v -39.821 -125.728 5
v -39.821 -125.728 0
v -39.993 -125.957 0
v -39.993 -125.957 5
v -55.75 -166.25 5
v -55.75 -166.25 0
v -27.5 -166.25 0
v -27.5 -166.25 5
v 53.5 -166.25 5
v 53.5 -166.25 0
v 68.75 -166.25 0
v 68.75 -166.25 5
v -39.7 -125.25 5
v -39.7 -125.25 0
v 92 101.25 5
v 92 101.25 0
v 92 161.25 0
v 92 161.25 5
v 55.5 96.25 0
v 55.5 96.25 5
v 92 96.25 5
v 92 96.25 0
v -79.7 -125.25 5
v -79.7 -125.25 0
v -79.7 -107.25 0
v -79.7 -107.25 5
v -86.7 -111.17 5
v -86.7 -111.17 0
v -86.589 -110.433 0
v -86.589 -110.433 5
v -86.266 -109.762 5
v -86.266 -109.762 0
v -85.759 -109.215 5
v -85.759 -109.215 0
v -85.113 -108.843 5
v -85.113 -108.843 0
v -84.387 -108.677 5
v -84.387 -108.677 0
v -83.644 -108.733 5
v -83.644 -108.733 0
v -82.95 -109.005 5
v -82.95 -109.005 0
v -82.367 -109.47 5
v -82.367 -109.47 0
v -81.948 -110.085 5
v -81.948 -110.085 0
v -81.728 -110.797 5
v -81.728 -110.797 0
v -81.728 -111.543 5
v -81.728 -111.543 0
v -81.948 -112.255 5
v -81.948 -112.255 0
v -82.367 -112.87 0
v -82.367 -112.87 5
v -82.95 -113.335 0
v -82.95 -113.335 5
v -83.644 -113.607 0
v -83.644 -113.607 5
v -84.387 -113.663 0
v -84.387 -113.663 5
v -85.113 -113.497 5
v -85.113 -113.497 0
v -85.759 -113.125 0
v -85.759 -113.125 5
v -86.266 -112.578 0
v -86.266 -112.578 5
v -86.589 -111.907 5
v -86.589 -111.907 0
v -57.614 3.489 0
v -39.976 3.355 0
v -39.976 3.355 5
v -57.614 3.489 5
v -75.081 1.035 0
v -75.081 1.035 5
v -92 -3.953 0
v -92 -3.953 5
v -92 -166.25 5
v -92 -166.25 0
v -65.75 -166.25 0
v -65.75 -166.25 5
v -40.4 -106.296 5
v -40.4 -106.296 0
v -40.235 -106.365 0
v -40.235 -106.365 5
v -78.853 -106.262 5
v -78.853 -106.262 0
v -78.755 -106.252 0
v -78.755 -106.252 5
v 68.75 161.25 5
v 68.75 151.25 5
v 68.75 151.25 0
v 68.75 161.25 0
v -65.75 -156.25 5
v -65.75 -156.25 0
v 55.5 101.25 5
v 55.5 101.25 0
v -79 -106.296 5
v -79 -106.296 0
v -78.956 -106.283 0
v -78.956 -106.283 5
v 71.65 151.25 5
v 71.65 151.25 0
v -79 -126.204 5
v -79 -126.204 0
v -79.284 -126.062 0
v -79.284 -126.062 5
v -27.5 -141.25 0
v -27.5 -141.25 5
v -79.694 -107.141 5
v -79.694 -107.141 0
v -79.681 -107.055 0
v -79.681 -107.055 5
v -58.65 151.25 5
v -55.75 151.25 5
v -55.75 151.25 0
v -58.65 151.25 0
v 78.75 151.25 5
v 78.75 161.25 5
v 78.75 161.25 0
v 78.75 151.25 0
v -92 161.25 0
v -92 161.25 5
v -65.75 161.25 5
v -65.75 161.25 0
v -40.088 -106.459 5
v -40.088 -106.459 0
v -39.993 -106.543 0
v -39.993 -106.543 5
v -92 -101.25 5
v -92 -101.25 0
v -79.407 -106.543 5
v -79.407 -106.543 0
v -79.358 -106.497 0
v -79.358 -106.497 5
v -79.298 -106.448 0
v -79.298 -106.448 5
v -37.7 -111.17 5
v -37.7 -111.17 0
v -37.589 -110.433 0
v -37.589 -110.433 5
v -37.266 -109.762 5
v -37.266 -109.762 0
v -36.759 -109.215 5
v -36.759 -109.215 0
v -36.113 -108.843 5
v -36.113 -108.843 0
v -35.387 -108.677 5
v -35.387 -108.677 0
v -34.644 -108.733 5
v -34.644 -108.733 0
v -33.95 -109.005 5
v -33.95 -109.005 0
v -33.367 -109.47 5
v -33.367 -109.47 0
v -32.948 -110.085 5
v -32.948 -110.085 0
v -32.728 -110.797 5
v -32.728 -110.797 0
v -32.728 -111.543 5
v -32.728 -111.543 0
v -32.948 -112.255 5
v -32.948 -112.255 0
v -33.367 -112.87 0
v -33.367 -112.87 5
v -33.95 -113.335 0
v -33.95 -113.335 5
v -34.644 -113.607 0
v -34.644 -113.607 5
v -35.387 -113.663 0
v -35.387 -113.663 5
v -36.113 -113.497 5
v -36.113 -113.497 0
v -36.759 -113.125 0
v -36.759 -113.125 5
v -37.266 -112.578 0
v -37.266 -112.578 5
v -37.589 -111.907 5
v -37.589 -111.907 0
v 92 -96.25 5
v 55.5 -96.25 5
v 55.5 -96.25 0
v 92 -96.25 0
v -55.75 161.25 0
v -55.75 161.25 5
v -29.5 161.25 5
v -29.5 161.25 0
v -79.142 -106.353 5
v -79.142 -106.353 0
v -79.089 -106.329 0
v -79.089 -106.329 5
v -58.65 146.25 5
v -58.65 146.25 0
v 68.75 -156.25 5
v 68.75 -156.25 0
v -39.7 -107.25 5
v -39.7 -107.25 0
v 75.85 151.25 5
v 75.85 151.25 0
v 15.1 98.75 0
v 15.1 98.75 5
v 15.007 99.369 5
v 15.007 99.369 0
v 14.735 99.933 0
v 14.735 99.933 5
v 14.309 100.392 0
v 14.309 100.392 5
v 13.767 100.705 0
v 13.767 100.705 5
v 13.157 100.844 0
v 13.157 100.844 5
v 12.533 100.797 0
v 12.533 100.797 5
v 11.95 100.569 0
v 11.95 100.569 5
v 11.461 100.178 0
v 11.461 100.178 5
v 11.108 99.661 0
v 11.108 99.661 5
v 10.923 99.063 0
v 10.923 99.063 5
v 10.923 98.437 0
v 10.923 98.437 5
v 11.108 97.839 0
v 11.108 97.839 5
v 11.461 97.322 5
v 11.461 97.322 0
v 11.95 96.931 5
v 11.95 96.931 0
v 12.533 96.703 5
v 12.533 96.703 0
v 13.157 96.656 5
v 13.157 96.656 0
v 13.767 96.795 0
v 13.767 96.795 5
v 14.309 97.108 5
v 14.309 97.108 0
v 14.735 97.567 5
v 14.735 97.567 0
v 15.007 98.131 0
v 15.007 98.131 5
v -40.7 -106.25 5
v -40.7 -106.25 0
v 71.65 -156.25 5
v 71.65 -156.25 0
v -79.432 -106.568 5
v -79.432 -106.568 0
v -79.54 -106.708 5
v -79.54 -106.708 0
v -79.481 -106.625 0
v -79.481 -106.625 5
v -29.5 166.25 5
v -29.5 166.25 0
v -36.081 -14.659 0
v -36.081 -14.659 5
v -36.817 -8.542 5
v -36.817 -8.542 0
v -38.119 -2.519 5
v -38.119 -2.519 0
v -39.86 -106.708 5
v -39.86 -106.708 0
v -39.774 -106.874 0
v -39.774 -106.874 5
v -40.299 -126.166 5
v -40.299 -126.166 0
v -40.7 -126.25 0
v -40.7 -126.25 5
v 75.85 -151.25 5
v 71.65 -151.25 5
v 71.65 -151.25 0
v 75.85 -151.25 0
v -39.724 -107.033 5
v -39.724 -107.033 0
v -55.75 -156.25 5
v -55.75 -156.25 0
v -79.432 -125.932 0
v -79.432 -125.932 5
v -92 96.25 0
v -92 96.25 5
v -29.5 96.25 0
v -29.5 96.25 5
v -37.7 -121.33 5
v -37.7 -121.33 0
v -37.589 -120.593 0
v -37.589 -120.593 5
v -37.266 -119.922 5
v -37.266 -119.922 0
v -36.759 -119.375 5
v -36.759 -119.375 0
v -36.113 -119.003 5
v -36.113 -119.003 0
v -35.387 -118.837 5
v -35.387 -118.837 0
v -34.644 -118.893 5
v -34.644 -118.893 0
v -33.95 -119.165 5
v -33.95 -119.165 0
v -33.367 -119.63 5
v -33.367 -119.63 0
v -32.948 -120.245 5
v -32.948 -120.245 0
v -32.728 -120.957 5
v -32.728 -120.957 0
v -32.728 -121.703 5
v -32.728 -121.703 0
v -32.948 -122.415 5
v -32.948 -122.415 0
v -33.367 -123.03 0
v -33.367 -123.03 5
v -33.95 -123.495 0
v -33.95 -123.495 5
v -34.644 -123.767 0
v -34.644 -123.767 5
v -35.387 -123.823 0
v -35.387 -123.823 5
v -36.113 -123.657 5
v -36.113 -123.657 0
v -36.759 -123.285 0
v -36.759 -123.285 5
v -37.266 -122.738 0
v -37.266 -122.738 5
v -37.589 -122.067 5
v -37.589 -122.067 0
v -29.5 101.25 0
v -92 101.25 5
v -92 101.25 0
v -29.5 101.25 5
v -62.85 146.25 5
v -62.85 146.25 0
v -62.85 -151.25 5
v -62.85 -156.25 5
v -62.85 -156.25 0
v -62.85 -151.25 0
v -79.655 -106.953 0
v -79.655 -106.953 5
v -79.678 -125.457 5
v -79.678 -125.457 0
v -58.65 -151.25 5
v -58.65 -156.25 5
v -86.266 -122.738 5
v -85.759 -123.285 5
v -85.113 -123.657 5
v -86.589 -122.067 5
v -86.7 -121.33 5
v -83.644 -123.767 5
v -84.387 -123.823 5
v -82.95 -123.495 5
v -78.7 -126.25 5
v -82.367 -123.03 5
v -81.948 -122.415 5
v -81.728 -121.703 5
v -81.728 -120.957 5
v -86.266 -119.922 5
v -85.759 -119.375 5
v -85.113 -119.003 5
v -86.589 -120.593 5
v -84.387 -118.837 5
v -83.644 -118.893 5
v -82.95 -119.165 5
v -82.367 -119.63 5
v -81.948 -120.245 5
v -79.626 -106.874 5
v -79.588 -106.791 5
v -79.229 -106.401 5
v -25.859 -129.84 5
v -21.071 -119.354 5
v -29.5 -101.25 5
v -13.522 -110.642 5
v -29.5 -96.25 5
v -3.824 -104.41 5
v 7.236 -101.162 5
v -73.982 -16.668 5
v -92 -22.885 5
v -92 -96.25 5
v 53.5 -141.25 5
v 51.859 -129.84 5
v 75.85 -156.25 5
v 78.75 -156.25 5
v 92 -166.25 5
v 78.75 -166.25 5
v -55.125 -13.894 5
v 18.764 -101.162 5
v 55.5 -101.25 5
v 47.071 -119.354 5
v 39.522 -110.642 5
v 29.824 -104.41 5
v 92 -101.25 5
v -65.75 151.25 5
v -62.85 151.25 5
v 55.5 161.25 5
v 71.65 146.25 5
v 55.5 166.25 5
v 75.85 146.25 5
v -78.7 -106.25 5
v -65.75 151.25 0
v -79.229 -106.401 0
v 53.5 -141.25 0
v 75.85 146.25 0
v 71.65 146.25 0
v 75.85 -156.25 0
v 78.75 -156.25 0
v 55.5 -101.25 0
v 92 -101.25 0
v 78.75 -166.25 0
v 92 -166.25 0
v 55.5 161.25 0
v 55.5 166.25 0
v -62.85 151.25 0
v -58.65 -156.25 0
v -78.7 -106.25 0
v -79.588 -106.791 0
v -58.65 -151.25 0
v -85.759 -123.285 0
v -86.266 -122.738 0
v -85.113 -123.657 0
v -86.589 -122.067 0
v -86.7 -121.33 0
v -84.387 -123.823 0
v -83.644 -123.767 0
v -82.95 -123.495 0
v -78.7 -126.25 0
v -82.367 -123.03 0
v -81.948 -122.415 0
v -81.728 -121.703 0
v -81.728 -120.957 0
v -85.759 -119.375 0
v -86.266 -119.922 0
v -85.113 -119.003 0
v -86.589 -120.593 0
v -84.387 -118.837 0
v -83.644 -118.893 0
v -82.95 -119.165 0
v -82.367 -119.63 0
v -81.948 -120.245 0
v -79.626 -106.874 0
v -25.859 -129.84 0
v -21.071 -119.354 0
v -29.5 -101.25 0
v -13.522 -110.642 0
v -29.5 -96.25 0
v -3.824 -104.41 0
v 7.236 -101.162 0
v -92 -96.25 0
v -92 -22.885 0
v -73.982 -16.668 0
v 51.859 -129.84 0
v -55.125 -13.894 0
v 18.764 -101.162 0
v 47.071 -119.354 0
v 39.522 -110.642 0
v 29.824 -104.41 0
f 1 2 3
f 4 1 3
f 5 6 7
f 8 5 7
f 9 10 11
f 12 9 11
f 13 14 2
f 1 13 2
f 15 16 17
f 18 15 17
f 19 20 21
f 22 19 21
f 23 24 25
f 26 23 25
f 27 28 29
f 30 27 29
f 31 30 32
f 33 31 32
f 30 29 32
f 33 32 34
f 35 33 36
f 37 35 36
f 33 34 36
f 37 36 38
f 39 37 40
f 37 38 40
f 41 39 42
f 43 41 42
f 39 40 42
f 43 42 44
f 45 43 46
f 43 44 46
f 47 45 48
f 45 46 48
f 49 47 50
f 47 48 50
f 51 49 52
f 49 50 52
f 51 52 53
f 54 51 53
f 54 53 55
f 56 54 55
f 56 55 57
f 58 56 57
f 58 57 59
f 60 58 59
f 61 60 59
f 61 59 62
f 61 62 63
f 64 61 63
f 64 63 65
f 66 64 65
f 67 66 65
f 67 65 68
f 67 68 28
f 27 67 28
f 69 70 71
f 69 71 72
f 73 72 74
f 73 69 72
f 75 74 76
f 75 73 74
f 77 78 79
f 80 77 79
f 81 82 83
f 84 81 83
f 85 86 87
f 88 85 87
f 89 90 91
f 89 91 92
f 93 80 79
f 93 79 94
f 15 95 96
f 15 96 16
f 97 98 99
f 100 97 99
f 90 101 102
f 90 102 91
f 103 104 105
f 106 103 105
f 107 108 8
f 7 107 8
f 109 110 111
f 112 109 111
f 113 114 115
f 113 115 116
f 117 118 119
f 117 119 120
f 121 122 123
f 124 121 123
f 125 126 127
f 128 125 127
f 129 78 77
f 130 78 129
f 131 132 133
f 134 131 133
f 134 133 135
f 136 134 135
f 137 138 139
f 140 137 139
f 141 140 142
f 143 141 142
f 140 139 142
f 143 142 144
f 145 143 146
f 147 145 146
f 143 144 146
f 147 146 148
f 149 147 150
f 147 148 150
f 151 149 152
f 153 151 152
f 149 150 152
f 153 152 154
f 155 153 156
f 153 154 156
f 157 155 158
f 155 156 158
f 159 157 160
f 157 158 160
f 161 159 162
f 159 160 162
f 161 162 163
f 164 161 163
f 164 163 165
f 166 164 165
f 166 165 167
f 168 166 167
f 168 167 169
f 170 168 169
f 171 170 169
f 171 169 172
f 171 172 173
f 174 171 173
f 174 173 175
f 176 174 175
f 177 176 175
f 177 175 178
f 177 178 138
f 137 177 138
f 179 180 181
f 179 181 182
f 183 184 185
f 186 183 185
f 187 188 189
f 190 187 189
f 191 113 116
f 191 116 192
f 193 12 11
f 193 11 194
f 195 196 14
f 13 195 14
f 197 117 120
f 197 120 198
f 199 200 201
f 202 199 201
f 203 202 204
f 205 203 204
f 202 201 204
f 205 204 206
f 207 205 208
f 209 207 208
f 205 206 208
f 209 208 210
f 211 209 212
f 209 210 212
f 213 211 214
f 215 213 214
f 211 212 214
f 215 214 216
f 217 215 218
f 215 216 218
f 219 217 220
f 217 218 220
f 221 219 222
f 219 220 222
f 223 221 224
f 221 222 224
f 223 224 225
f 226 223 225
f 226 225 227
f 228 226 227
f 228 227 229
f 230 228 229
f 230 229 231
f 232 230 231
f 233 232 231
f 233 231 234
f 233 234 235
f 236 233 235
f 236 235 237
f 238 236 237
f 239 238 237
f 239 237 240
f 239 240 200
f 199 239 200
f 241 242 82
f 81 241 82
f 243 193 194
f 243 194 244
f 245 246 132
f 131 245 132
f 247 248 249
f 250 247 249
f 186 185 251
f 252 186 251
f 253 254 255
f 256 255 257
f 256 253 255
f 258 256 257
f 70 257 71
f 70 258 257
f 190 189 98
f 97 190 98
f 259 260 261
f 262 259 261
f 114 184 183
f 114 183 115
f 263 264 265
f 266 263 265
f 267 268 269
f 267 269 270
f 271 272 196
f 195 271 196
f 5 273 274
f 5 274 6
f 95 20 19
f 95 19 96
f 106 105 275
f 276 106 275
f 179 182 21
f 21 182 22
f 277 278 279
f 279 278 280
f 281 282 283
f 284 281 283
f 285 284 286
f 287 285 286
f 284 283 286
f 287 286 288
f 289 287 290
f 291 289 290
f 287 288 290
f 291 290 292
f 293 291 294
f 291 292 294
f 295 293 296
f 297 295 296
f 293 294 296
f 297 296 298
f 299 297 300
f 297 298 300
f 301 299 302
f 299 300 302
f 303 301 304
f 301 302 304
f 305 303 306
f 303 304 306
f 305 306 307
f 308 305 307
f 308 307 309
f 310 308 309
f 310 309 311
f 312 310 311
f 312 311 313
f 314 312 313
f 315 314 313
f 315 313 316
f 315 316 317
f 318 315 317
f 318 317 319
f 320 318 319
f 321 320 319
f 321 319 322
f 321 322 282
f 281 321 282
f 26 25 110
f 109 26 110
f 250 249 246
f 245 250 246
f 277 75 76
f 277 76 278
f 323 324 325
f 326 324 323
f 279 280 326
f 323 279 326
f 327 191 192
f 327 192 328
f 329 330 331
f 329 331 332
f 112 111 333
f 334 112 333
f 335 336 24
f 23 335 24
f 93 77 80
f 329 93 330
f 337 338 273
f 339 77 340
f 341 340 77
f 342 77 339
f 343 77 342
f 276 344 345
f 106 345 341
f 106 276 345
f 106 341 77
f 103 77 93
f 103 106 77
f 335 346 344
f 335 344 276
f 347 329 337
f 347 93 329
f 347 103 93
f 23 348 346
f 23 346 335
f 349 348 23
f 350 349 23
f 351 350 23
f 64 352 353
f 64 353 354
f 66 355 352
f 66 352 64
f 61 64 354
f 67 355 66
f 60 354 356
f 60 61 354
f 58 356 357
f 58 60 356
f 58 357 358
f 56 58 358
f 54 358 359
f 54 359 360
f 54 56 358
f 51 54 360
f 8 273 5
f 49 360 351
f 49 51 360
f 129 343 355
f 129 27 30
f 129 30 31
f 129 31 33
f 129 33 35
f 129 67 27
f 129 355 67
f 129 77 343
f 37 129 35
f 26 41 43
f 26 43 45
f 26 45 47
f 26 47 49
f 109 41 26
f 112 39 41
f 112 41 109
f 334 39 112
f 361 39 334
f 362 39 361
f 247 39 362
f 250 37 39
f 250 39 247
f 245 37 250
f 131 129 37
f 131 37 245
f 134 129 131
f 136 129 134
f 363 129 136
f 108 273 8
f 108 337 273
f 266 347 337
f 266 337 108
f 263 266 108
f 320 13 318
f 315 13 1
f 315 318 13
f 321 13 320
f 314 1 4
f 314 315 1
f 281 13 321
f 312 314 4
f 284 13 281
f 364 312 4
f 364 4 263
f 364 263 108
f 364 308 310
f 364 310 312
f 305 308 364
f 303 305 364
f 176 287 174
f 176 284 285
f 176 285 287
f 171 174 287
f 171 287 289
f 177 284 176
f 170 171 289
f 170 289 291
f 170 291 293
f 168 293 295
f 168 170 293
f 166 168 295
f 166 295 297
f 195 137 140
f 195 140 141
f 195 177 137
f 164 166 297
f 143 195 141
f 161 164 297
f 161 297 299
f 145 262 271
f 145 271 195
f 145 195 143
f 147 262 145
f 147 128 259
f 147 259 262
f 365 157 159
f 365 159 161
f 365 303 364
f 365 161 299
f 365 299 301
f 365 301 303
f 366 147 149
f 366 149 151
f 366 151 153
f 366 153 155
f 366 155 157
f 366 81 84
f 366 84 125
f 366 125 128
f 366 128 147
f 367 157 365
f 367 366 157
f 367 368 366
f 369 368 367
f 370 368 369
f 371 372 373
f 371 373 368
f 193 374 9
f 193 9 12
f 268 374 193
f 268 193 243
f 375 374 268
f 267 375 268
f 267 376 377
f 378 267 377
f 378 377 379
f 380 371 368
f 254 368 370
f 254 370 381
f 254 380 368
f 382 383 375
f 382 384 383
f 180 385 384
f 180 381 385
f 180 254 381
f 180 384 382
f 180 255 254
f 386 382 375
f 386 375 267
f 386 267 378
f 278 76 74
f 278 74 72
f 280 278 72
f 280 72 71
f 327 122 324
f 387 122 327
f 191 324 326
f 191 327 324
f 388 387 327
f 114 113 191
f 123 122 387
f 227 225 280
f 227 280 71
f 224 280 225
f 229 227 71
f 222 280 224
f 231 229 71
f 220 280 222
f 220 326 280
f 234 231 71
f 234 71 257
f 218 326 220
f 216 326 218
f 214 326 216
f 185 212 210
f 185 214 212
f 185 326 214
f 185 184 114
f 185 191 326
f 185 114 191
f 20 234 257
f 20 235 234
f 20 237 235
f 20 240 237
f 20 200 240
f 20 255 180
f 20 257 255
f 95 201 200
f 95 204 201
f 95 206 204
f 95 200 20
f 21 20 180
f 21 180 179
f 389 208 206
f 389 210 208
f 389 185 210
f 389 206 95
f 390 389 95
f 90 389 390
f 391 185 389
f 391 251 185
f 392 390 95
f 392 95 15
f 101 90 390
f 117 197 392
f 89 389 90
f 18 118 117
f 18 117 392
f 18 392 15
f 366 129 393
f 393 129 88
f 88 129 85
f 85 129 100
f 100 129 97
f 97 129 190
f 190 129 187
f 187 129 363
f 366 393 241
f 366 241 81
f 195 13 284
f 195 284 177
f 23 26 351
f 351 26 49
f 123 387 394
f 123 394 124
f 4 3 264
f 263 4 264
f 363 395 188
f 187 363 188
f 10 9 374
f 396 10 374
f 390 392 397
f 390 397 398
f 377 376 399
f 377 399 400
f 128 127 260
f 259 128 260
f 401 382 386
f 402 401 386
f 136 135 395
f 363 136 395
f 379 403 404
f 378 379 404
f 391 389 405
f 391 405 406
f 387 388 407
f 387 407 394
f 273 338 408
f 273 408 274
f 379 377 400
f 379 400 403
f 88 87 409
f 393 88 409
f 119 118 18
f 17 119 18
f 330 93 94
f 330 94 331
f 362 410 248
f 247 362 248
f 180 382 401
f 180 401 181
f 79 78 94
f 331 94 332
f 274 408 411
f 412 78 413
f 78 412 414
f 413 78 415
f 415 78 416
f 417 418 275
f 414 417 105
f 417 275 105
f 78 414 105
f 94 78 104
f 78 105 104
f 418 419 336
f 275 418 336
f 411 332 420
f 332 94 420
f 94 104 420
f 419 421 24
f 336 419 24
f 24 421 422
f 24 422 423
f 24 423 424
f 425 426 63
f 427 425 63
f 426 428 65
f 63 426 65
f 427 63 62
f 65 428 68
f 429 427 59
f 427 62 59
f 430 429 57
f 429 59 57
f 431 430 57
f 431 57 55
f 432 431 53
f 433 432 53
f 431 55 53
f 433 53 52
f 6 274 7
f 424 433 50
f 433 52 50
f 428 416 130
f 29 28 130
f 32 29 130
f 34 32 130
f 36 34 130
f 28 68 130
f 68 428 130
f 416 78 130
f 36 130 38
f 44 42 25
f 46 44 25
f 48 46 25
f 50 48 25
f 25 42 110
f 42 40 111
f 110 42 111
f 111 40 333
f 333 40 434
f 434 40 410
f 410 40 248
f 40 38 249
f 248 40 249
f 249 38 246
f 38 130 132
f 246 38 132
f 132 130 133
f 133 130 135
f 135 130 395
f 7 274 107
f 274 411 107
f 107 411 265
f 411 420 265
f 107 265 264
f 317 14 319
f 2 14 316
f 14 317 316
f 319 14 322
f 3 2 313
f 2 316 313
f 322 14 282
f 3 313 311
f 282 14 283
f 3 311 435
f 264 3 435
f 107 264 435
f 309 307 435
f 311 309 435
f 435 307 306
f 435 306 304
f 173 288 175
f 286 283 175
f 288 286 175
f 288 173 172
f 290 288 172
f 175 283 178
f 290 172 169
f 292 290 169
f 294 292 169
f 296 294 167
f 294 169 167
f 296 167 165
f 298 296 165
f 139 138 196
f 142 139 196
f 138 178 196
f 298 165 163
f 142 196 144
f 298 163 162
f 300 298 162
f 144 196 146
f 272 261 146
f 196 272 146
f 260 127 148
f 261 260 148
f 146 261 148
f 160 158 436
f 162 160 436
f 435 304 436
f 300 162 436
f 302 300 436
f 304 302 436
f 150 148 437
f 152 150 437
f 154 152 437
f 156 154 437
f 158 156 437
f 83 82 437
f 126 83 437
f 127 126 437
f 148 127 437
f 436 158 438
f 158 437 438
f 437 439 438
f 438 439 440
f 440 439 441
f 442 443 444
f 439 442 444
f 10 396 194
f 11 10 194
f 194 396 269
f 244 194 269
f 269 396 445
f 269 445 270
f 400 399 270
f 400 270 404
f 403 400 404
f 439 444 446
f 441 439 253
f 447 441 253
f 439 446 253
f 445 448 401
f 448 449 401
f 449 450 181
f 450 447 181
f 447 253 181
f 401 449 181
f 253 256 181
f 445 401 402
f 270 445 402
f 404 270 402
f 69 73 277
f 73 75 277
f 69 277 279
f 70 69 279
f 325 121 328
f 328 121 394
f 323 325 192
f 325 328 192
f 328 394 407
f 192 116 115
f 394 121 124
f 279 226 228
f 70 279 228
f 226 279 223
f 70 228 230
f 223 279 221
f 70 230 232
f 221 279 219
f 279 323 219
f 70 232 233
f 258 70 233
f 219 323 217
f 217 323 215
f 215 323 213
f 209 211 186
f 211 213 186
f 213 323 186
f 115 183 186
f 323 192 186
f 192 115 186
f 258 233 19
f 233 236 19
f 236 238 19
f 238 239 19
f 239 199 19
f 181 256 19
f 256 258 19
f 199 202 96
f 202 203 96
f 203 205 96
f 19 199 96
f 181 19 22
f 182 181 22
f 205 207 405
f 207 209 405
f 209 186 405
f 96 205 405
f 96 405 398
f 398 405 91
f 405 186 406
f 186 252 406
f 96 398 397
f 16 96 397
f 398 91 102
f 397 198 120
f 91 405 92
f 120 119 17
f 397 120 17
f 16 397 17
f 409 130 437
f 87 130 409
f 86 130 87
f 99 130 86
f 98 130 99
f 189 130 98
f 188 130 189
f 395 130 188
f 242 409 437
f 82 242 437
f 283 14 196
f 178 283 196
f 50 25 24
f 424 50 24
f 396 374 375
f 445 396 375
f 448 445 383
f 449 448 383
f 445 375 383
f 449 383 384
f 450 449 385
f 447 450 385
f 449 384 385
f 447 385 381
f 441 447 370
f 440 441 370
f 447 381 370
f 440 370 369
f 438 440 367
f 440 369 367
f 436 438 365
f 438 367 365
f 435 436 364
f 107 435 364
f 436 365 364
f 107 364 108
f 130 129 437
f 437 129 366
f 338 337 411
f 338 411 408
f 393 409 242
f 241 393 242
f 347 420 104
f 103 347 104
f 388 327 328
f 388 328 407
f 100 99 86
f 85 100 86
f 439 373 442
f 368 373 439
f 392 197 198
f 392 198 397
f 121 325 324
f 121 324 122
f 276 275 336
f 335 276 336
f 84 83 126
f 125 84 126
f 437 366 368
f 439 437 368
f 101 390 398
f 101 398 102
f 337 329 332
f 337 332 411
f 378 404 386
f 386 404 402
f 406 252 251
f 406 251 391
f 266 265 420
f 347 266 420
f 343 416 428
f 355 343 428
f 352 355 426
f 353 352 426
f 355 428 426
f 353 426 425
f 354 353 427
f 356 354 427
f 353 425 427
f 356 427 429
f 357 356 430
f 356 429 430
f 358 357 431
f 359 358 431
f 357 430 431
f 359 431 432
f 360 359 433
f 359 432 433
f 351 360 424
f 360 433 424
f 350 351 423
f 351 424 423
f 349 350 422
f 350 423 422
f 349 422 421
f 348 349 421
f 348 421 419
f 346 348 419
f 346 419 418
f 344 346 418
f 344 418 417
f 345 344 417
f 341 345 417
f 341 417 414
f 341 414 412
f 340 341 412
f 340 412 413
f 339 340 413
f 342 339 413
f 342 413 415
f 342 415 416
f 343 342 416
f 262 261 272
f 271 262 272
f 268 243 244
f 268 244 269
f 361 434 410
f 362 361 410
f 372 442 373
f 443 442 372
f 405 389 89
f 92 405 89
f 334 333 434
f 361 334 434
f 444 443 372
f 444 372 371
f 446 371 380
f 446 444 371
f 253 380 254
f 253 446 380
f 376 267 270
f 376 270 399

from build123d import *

# Parameters (mm, degrees)
SKETCH2_W           = 184
SKETCH2_H           = 332.5
BOSS_EXTRUDE1_DEPTH = 5
SKETCH3_W           = 62.5
SKETCH3_H           = 5
SKETCH3_W_2         = 36.5
CUT_EXTRUDE2_DEPTH  = 5
CUT_EXTRUDE3_DEPTH  = 10
SKETCH5_R           = 2.1
CUT_EXTRUDE4_DEPTH  = 10
SKETCH6_R           = 2.5
CUT_EXTRUDE5_DEPTH  = 20
CUT_EXTRUDE6_DEPTH  = 10


with BuildPart() as part:
    # Sketch2 → Boss-Extrude1 (new body)
    with BuildSketch(Plane.XY):
        Rectangle(SKETCH2_W, SKETCH2_H)
    extrude(amount=BOSS_EXTRUDE1_DEPTH)

    # Sketch3 → Cut-Extrude2 (cut)
    with BuildSketch(Plane.XY.offset(5)):
        with Locations((-60.75, -98.75)):
            Rectangle(SKETCH3_W, SKETCH3_H)
        with Locations((73.75, -98.75)):
            Rectangle(SKETCH3_W_2, SKETCH3_H)
        with BuildLine():
            Line((-27.5, -141.25), (-27.5, -166.25))
            Line((-27.5, -166.25), (53.5, -166.25))
            Line((53.5, -166.25), (53.5, -141.25))
            ThreePointArc((53.5, -141.25), (13, -100.75), (-27.5, -141.25))
        make_face()
        with Locations((-60.75, 163.75)):
            Rectangle(SKETCH3_W, SKETCH3_H)
        with Locations((73.75, 163.75)):
            Rectangle(SKETCH3_W_2, SKETCH3_H)
        with Locations((-60.75, 98.75)):
            Rectangle(SKETCH3_W, SKETCH3_H)
        with Locations((73.75, 98.75)):
            Rectangle(SKETCH3_W_2, SKETCH3_H)
    extrude(amount=-CUT_EXTRUDE2_DEPTH, mode=Mode.SUBTRACT)

    # Sketch4 → Cut-Extrude3 (cut)
    with BuildSketch(Plane.XY.offset(5)):
        Polygon((-55.75, 161.25), (-55.75, 151.25), (-58.65, 151.25), (-58.65, 146.25), (-62.85, 146.25), (-62.85, 151.25), (-65.75, 151.25), (-65.75, 161.25), align=None)
        Polygon((78.75, 161.25), (78.75, 151.25), (75.85, 151.25), (75.85, 146.25), (71.65, 146.25), (71.65, 151.25), (68.75, 151.25), (68.75, 161.25), align=None)
        Polygon((68.75, -166.25), (68.75, -156.25), (71.65, -156.25), (71.65, -151.25), (75.85, -151.25), (75.85, -156.25), (78.75, -156.25), (78.75, -166.25), align=None)
        Polygon((-65.75, -166.25), (-65.75, -156.25), (-62.85, -156.25), (-62.85, -151.25), (-58.65, -151.25), (-58.65, -156.25), (-55.75, -156.25), (-55.75, -166.25), align=None)
    extrude(amount=-CUT_EXTRUDE3_DEPTH, mode=Mode.SUBTRACT)

    # Sketch5 → Cut-Extrude4 (cut)
    with BuildSketch(Plane.XY.offset(5)):
        with Locations((13, 98.75)):
            Circle(SKETCH5_R)
    extrude(amount=-CUT_EXTRUDE4_DEPTH, mode=Mode.SUBTRACT)

    # Sketch6 → Cut-Extrude5 (cut)
    with BuildSketch(Plane(origin=(0, 0, 0), x_dir=(-1, 0, 0), z_dir=(0, 0, -1))):
        with Locations((35.2, -111.17)):
            Circle(SKETCH6_R)
        with Locations((35.2, -121.33)):
            Circle(SKETCH6_R)
        with Locations((84.2, -121.33)):
            Circle(SKETCH6_R)
        with Locations((84.2, -111.17)):
            Circle(SKETCH6_R)
        Polygon((40.7, -106.25), (40.399667757, -106.296165348), (40.234631653, -106.364882888), (40.087708911, -106.459367581), (39.992893219, -106.542893219), (39.859754352, -106.707794088), (39.773544355, -106.873596044), (39.723897446, -107.032689615), (39.7, -107.25), (39.7, -125.25), (39.821493713, -125.727730786), (39.992893219, -125.957106781), (40.299461949, -126.166280126), (40.7, -126.25), (78.2, -126.25), (78.7, -126.25), (79.000332243, -126.203834652), (79.284083673, -126.061693454), (79.431556814, -125.931780484), (79.678284878, -125.4572648), (79.7, -125.25), (79.7, -107.25), (79.694079498, -107.141344807), (79.68082013, -107.055084963), (79.654773565, -106.952666114), (79.626455645, -106.873596044), (79.58827866, -106.790695066), (79.540245648, -106.707794088), (79.480899769, -106.625343654), (79.431556814, -106.568219516), (79.407106781, -106.542893219), (79.357820244, -106.496825036), (79.297626381, -106.448225275), (79.228612143, -106.401136523), (79.142207958, -106.35308745), (79.088762914, -106.32866217), (79.000332243, -106.296165348), (78.955551566, -106.283204573), (78.853081535, -106.261786438), (78.755064535, -106.251517202), (78.7, -106.25), align=None)
    extrude(amount=-CUT_EXTRUDE5_DEPTH, mode=Mode.SUBTRACT)

    # Sketch7 → Cut-Extrude6 (cut)
    with BuildSketch(Plane(origin=(0, 0, 0), x_dir=(-1, 0, 0), z_dir=(0, 0, -1))):
        with BuildLine():
            Line((92.154047247, -4.010729367), (92, -22.885338591))
            ThreePointArc((92, -22.885338591), (64.618518363, -14.841480585), (36.080546525, -14.658856257))
            ThreePointArc((36.080546525, -14.658856257), (37.397553955, -5.515336457), (39.976105832, 3.355375641))
            ThreePointArc((39.976105832, 3.355375641), (66.474403295, 2.571796797), (92.154047247, -4.010729367))
        make_face()
    extrude(amount=-CUT_EXTRUDE6_DEPTH, mode=Mode.SUBTRACT)


solid = part.part
